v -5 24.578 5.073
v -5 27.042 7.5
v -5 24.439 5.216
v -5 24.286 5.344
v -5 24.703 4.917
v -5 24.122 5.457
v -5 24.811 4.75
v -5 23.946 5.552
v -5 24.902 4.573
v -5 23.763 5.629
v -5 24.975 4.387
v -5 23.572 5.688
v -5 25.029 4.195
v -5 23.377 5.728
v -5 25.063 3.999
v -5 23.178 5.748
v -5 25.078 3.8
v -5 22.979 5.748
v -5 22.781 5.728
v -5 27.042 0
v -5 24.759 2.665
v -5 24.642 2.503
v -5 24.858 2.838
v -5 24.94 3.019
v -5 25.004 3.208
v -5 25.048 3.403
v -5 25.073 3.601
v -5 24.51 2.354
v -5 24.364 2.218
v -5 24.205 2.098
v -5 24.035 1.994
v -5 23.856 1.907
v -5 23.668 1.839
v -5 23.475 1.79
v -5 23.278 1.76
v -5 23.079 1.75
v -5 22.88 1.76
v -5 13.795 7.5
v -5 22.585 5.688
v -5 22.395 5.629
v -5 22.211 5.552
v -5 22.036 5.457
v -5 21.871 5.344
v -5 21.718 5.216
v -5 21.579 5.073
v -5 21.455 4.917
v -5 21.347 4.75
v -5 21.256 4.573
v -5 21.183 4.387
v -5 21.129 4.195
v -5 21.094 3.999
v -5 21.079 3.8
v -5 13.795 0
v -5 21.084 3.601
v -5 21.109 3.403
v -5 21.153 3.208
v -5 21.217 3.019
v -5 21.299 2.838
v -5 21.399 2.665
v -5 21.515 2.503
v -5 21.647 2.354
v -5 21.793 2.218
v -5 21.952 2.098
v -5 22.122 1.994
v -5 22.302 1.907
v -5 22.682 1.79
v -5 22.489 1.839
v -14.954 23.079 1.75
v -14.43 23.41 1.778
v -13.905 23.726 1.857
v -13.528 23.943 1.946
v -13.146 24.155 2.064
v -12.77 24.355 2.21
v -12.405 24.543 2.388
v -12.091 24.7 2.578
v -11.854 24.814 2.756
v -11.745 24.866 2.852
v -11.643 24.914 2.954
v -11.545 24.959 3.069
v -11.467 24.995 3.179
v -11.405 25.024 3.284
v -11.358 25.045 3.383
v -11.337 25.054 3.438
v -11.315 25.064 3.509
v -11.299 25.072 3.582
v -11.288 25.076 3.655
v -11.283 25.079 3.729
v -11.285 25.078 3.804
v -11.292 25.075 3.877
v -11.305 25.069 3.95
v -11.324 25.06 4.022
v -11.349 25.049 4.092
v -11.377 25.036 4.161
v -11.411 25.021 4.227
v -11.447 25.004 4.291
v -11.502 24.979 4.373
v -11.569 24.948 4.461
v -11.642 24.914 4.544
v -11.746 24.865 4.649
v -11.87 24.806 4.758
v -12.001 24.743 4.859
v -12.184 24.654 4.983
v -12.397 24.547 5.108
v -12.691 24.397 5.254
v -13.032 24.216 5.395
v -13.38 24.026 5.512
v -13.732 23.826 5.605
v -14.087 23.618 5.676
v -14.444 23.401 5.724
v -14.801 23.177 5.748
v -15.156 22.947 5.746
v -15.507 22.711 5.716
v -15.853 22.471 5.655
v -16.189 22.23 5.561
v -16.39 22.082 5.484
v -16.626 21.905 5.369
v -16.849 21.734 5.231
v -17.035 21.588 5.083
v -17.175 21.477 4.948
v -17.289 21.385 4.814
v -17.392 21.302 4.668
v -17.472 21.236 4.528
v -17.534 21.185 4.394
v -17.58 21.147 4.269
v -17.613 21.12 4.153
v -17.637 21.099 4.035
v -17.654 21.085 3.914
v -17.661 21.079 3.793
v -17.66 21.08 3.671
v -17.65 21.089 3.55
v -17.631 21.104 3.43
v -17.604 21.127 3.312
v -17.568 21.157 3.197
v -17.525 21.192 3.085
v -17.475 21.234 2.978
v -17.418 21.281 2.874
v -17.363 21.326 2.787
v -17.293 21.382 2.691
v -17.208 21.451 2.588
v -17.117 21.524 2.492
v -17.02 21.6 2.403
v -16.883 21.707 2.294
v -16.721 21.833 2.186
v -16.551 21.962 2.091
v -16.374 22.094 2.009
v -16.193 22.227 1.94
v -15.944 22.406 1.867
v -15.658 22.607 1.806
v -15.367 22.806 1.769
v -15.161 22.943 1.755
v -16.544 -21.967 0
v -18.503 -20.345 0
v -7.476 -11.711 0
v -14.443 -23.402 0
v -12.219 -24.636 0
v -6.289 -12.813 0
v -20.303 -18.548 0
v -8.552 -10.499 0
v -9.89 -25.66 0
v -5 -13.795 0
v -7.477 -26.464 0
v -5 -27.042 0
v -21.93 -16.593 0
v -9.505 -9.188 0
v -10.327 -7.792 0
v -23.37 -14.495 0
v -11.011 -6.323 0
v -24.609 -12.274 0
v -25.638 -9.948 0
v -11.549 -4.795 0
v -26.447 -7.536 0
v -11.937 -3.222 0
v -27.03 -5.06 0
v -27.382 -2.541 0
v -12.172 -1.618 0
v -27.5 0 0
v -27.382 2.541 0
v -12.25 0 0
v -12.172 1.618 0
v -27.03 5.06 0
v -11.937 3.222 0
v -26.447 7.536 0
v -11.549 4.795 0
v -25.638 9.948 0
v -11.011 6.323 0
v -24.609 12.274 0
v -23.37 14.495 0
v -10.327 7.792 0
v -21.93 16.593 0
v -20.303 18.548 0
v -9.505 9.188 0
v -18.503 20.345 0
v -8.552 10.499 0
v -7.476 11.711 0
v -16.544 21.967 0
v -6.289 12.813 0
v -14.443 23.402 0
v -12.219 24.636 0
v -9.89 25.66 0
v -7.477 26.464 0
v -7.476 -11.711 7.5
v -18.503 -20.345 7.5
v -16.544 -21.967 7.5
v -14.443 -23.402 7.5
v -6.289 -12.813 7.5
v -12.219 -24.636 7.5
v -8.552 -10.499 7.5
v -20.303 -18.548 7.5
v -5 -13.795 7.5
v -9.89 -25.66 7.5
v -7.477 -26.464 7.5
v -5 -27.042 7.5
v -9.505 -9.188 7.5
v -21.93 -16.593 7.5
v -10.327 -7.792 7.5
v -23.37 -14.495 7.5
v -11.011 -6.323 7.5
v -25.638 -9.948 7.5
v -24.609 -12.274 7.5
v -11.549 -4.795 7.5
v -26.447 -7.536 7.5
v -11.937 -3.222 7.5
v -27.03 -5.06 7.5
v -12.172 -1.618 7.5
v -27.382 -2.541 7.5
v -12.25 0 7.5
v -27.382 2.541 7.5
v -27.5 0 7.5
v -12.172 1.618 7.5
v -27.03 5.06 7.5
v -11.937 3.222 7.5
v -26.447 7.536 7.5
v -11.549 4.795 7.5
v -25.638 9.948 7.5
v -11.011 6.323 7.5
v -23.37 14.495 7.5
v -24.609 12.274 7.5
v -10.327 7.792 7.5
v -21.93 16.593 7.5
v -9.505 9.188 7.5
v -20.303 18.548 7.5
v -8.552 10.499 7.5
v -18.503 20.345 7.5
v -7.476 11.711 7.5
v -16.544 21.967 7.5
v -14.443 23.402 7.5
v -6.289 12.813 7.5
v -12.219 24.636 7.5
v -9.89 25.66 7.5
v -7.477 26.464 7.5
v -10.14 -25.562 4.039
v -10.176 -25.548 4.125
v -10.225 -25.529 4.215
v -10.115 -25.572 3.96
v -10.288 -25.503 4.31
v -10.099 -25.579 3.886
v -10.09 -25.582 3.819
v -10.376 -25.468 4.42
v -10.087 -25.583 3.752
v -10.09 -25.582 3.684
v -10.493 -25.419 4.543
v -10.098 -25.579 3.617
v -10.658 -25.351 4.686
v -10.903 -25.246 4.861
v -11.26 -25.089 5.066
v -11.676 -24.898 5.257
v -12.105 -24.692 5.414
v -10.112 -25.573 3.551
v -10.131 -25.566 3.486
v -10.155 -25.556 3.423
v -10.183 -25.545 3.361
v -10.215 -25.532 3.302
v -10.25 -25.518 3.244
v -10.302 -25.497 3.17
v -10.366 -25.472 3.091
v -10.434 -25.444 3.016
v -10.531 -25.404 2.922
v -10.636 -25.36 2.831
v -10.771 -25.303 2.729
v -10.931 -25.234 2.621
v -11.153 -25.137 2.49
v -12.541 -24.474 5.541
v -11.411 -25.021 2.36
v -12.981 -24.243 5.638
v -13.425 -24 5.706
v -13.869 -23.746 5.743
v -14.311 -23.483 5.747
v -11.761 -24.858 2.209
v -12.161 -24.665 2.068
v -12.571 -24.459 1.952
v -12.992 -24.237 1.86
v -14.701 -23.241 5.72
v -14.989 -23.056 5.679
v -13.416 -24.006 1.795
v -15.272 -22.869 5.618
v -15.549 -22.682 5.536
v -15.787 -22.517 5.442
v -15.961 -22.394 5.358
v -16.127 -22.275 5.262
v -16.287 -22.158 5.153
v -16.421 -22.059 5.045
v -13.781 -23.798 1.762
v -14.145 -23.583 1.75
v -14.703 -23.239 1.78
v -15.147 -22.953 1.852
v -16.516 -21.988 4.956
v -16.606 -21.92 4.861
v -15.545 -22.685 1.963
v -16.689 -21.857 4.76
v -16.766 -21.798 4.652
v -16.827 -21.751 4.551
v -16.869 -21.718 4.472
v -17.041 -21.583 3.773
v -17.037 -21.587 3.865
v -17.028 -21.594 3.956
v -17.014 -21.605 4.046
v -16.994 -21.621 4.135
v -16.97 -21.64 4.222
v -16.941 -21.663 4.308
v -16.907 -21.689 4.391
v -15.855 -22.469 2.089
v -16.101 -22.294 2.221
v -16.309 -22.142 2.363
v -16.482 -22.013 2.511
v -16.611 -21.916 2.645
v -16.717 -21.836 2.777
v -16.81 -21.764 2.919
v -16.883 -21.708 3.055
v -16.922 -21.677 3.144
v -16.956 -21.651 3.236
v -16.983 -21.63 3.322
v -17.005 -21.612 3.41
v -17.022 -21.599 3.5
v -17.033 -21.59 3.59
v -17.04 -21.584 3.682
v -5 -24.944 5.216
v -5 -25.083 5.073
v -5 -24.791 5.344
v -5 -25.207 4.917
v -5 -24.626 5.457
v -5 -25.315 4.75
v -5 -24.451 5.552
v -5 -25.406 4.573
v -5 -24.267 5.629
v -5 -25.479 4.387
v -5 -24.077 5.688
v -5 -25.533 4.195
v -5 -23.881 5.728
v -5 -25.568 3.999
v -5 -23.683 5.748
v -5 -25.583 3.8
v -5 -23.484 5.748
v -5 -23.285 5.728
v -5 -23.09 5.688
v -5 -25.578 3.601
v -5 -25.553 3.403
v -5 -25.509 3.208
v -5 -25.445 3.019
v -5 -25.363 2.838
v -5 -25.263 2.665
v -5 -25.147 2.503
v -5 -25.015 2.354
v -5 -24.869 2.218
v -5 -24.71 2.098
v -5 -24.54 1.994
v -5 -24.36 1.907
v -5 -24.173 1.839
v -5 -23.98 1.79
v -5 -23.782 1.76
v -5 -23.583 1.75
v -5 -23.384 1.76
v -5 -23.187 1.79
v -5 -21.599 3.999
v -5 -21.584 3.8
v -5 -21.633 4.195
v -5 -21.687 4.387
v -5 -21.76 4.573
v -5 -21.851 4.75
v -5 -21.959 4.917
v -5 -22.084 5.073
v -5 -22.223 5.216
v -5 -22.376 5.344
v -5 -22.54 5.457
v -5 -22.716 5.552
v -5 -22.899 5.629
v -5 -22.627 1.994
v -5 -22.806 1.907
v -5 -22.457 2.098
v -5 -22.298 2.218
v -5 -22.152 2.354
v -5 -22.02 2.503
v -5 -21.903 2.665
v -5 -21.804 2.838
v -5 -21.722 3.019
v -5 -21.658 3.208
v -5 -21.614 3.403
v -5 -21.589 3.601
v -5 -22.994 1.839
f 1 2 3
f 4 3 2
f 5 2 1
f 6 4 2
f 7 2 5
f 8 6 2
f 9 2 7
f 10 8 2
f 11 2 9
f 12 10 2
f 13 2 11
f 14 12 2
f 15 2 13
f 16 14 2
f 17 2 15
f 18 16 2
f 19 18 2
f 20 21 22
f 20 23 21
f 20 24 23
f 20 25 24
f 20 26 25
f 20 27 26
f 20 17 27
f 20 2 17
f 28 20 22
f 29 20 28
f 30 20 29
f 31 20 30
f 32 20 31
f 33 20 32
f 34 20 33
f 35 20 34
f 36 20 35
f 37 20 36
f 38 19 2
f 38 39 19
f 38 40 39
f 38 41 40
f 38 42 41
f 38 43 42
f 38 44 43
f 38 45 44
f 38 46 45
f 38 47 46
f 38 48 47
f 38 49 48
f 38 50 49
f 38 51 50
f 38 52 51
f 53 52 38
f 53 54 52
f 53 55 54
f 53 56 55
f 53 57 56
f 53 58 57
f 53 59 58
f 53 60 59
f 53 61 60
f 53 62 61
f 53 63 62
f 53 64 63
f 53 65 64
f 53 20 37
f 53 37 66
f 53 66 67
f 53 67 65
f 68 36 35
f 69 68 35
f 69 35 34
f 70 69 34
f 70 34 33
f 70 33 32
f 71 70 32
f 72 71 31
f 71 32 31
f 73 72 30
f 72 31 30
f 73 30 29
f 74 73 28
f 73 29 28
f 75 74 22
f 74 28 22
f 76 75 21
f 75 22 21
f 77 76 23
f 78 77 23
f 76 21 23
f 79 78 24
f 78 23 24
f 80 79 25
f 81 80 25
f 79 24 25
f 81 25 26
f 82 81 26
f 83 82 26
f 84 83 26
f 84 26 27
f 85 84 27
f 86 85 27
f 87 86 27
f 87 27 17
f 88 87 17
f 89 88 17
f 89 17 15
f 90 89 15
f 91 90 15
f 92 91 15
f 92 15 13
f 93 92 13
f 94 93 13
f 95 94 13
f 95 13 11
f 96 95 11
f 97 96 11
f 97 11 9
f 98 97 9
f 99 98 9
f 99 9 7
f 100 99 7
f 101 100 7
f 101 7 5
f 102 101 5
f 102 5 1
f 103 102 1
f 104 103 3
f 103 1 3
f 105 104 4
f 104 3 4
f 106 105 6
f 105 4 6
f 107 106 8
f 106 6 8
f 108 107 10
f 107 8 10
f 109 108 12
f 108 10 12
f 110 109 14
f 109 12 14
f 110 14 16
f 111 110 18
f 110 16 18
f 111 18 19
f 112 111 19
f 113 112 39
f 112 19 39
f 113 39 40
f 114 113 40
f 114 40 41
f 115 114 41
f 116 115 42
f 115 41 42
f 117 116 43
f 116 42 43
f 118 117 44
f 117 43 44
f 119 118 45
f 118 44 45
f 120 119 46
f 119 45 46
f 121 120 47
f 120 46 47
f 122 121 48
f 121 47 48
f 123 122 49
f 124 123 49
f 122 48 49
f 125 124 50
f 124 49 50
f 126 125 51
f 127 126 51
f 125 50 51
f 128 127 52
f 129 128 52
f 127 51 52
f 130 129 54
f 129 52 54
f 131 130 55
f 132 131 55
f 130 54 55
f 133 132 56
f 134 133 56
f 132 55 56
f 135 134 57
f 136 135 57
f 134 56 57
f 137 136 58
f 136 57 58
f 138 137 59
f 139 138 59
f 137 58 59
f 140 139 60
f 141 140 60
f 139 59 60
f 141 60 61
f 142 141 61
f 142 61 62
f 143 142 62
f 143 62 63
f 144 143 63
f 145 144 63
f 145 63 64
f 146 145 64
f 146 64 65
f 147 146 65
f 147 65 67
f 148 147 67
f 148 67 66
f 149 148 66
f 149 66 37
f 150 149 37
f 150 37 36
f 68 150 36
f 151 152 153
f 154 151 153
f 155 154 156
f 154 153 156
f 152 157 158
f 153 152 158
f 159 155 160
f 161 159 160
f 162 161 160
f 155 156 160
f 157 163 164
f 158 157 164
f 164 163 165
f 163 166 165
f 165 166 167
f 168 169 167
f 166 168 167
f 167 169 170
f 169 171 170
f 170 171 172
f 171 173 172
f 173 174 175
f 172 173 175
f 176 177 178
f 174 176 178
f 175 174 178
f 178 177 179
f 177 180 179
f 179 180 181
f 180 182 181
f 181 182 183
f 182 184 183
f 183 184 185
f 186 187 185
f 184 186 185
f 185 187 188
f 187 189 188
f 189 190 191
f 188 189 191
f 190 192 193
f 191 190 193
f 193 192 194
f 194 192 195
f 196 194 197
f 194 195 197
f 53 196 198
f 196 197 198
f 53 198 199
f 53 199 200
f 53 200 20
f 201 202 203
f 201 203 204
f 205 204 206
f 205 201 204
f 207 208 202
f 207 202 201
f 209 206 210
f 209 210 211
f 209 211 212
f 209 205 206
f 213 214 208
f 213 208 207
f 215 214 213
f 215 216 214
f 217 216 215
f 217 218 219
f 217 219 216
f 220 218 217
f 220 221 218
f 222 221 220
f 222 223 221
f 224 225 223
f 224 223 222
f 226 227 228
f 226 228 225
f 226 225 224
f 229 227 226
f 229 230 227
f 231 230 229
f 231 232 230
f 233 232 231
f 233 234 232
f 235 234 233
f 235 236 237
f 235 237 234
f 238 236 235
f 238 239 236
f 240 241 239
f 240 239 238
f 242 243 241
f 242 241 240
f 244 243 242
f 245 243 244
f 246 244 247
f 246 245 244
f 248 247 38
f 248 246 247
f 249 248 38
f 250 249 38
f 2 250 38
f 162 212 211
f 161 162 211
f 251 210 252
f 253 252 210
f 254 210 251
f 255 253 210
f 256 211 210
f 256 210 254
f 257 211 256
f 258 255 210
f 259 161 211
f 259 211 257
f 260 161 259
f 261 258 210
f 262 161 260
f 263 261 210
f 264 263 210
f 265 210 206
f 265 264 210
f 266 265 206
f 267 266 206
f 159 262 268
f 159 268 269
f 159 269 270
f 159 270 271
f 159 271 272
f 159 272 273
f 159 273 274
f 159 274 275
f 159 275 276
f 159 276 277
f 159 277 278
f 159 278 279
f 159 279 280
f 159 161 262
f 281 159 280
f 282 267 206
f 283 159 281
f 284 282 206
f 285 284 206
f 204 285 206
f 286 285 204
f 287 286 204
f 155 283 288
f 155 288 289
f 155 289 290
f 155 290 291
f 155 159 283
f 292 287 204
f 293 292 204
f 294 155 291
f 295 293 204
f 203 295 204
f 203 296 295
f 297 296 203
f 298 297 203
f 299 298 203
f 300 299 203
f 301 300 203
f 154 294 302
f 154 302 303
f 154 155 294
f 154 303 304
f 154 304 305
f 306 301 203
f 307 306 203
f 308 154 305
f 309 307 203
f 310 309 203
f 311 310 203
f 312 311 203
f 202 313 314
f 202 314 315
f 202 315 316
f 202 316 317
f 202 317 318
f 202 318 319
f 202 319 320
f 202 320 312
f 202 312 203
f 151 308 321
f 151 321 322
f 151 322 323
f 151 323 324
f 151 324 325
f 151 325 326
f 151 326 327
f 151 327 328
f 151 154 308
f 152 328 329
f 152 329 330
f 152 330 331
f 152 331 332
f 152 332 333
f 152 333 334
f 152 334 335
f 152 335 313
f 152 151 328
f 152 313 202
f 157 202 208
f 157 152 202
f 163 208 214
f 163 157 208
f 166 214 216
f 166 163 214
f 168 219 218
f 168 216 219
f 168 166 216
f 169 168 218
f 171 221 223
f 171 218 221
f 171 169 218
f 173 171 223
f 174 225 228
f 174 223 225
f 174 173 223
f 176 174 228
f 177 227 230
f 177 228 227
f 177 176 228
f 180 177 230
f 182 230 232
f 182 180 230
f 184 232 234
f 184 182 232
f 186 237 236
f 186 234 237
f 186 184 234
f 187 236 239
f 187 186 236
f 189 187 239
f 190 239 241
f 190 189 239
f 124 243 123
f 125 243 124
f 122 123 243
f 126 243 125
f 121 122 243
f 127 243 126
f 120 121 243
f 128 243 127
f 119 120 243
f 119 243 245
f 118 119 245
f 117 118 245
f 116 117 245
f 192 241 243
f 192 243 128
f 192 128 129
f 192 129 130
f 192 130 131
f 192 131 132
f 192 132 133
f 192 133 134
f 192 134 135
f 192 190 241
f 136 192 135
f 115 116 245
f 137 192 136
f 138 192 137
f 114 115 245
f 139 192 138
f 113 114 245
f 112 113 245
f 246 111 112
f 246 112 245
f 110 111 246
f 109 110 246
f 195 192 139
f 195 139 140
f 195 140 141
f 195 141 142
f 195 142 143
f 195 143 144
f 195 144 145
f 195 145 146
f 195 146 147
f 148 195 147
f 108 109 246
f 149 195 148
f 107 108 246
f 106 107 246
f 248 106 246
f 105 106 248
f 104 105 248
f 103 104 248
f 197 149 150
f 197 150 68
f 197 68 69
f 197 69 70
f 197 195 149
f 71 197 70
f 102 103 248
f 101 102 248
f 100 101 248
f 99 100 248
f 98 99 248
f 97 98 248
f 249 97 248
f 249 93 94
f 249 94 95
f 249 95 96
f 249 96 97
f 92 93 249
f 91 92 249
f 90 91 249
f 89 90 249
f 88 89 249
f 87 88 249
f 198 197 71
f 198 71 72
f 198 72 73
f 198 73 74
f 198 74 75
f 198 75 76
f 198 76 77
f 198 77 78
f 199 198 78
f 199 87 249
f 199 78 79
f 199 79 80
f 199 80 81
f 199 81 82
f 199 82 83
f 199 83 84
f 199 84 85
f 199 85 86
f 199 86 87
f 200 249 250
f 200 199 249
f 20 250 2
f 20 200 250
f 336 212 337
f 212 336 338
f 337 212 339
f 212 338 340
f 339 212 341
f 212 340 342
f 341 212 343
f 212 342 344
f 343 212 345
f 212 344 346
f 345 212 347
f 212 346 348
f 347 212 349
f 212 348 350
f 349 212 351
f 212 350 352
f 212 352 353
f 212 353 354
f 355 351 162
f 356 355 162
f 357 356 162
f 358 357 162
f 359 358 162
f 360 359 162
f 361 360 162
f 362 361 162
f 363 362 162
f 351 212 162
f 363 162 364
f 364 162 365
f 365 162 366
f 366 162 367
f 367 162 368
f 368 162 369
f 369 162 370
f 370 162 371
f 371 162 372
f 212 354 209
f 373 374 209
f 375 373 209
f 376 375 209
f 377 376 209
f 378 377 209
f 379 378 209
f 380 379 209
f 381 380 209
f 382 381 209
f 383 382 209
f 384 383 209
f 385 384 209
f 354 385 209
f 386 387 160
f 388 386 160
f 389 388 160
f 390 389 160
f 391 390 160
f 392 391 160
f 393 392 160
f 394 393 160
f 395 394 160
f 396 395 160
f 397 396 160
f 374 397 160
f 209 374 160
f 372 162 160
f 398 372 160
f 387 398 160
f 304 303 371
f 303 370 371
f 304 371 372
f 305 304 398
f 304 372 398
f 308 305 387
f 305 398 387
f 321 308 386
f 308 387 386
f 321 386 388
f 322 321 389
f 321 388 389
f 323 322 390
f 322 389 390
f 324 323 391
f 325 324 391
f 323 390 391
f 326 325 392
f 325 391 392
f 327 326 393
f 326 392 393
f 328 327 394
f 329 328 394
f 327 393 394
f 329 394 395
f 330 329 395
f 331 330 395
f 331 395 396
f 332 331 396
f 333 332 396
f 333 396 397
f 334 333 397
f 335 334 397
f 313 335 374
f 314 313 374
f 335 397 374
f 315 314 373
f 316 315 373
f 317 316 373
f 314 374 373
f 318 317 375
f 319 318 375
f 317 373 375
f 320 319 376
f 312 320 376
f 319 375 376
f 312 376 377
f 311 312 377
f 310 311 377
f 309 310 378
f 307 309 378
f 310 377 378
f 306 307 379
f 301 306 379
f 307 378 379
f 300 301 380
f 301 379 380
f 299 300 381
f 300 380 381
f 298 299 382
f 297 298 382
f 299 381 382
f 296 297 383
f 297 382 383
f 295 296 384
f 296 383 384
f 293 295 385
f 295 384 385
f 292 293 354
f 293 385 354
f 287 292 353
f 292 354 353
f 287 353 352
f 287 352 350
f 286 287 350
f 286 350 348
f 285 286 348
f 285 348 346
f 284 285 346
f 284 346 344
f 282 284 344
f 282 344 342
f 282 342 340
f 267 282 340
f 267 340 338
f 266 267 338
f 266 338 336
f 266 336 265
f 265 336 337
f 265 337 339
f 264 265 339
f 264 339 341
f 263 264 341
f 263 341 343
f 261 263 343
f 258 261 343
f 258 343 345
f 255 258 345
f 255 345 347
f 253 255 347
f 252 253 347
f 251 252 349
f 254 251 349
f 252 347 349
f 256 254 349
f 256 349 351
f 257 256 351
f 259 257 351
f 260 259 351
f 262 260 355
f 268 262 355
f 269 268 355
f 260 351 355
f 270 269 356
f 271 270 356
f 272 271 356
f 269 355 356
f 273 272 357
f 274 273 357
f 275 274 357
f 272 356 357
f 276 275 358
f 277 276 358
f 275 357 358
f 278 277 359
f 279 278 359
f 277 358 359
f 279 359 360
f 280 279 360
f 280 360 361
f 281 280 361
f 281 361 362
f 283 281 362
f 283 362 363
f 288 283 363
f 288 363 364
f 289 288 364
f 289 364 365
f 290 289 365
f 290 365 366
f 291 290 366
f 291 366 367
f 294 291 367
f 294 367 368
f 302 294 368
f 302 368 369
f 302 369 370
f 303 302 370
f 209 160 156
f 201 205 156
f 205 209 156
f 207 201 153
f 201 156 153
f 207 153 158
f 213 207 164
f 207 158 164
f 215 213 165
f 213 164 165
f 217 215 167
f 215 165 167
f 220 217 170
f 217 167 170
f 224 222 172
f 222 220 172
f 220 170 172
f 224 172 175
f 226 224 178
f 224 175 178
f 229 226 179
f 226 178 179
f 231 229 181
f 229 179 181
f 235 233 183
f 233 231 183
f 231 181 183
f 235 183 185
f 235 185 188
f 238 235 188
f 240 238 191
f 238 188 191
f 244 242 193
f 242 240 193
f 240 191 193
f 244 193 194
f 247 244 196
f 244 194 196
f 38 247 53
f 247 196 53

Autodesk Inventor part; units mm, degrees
ref_plane "YZ Plane" through (0, 0, 0) normal (1, 0, 0) x (0, 1, 0)
ref_plane "XZ Plane" through (0, 0, 0) normal (0, 1, 0) x (-1, 0, 0)
ref_plane "XY Plane" through (0, 0, 0) normal (0, 0, 1) x (1, 0, 0)
sketch "Sketch1" plane through (0, 0, 0) normal (0, 0, 1) x (1, 0, 0)
  arc A0 (0, 27.5) -> (0, -27.5) centre (0, 0) ccw
  arc A1 (-5, 13.7954) -> (-5, -13.7954) centre (4.5, 0) ccw
  line L0 (-5, -27.0416) -> (-5, -13.7954)
  arc A2 (-5, 27.0416) -> (-5, -27.0416) centre (0, 0) ccw
  line L1 (-5, 27.0416) -> (-5, 13.7954)
  point P0 (3.7885, 24.6247)
  point P1 (-3.7885, 24.6247)
  point P2 (-4.5, 0)
  point P3 (5, 27.5)
extrude "Extrusion1" add sketch "Sketch1" along normal blind 7.5
sketch "Sketch2" plane through (-5, -27.0416, 0) normal (1, 0, 0) x (0, 0, -1)
  line L0 (0, 6.9167) -> (7.5, 6.9167)
  line L1 (0, 0) -> (0, 6.9167)
  line L2 (0, 6.9167) -> (7.5, 6.9167)
  line L3 (7.5, 26.7893) -> (7.5, 0)
  line L4 (7.5, 6.9167) -> (7.5, 0)
  line L5 (7.5, 0) -> (0, 0)
  line L6 (7.5, 0) -> (0, 0)
  circle A0 centre (3.75, 3.4583) radius 1
  line L7 (0, 0) -> (3.0149, 2.7804)
  line L8 (4.4851, 4.1363) -> (7.5, 6.9167)
  line L9 (0, 6.9167) -> (3.0149, 4.1363)
  line L10 (4.4851, 2.7804) -> (7.5, 0)
  line L11 (0, 0) -> (0, 53.5786)
  line L12 (0, 53.5786) -> (0, 0)
  line L13 (0, 26.7893) -> (7.5, 26.7893)
  circle A1 centre (3.75, 50.1203) radius 1
  circle A2 centre (-3.75, 3.4583) radius 1
  circle A3 centre (-3.75, 50.1203) radius 1
  circle A4 centre (-3.75, 3.4583) radius 2
  circle A5 centre (-3.75, 50.1203) radius 2
  point P0 (0, 27.0416)
  point P1 (280.32, 51.414)
  dimension "d2" = 2
  dimension "d5" = 4
  dimension "d6" = 4
extrude "Extrusion2" cut sketch "Sketch2" against normal blind 25.4 contours A2 | A3
extrude "Extrusion3" cut sketch "Sketch2" against normal blind 18.575 contours A2 | A3 | A4 | A5
sketch "Sketch3" plane through (0, 0, 7.5) normal (0, 0, 1) x (1, 0, 0)
  line L0 (-5, 13.7954) -> (-5, 27.0416) projected
  arc A0 (-5, 27.0416) -> (-5, -27.0416) centre (0, 0) ccw projected
properties part number "Contrapeso5"
